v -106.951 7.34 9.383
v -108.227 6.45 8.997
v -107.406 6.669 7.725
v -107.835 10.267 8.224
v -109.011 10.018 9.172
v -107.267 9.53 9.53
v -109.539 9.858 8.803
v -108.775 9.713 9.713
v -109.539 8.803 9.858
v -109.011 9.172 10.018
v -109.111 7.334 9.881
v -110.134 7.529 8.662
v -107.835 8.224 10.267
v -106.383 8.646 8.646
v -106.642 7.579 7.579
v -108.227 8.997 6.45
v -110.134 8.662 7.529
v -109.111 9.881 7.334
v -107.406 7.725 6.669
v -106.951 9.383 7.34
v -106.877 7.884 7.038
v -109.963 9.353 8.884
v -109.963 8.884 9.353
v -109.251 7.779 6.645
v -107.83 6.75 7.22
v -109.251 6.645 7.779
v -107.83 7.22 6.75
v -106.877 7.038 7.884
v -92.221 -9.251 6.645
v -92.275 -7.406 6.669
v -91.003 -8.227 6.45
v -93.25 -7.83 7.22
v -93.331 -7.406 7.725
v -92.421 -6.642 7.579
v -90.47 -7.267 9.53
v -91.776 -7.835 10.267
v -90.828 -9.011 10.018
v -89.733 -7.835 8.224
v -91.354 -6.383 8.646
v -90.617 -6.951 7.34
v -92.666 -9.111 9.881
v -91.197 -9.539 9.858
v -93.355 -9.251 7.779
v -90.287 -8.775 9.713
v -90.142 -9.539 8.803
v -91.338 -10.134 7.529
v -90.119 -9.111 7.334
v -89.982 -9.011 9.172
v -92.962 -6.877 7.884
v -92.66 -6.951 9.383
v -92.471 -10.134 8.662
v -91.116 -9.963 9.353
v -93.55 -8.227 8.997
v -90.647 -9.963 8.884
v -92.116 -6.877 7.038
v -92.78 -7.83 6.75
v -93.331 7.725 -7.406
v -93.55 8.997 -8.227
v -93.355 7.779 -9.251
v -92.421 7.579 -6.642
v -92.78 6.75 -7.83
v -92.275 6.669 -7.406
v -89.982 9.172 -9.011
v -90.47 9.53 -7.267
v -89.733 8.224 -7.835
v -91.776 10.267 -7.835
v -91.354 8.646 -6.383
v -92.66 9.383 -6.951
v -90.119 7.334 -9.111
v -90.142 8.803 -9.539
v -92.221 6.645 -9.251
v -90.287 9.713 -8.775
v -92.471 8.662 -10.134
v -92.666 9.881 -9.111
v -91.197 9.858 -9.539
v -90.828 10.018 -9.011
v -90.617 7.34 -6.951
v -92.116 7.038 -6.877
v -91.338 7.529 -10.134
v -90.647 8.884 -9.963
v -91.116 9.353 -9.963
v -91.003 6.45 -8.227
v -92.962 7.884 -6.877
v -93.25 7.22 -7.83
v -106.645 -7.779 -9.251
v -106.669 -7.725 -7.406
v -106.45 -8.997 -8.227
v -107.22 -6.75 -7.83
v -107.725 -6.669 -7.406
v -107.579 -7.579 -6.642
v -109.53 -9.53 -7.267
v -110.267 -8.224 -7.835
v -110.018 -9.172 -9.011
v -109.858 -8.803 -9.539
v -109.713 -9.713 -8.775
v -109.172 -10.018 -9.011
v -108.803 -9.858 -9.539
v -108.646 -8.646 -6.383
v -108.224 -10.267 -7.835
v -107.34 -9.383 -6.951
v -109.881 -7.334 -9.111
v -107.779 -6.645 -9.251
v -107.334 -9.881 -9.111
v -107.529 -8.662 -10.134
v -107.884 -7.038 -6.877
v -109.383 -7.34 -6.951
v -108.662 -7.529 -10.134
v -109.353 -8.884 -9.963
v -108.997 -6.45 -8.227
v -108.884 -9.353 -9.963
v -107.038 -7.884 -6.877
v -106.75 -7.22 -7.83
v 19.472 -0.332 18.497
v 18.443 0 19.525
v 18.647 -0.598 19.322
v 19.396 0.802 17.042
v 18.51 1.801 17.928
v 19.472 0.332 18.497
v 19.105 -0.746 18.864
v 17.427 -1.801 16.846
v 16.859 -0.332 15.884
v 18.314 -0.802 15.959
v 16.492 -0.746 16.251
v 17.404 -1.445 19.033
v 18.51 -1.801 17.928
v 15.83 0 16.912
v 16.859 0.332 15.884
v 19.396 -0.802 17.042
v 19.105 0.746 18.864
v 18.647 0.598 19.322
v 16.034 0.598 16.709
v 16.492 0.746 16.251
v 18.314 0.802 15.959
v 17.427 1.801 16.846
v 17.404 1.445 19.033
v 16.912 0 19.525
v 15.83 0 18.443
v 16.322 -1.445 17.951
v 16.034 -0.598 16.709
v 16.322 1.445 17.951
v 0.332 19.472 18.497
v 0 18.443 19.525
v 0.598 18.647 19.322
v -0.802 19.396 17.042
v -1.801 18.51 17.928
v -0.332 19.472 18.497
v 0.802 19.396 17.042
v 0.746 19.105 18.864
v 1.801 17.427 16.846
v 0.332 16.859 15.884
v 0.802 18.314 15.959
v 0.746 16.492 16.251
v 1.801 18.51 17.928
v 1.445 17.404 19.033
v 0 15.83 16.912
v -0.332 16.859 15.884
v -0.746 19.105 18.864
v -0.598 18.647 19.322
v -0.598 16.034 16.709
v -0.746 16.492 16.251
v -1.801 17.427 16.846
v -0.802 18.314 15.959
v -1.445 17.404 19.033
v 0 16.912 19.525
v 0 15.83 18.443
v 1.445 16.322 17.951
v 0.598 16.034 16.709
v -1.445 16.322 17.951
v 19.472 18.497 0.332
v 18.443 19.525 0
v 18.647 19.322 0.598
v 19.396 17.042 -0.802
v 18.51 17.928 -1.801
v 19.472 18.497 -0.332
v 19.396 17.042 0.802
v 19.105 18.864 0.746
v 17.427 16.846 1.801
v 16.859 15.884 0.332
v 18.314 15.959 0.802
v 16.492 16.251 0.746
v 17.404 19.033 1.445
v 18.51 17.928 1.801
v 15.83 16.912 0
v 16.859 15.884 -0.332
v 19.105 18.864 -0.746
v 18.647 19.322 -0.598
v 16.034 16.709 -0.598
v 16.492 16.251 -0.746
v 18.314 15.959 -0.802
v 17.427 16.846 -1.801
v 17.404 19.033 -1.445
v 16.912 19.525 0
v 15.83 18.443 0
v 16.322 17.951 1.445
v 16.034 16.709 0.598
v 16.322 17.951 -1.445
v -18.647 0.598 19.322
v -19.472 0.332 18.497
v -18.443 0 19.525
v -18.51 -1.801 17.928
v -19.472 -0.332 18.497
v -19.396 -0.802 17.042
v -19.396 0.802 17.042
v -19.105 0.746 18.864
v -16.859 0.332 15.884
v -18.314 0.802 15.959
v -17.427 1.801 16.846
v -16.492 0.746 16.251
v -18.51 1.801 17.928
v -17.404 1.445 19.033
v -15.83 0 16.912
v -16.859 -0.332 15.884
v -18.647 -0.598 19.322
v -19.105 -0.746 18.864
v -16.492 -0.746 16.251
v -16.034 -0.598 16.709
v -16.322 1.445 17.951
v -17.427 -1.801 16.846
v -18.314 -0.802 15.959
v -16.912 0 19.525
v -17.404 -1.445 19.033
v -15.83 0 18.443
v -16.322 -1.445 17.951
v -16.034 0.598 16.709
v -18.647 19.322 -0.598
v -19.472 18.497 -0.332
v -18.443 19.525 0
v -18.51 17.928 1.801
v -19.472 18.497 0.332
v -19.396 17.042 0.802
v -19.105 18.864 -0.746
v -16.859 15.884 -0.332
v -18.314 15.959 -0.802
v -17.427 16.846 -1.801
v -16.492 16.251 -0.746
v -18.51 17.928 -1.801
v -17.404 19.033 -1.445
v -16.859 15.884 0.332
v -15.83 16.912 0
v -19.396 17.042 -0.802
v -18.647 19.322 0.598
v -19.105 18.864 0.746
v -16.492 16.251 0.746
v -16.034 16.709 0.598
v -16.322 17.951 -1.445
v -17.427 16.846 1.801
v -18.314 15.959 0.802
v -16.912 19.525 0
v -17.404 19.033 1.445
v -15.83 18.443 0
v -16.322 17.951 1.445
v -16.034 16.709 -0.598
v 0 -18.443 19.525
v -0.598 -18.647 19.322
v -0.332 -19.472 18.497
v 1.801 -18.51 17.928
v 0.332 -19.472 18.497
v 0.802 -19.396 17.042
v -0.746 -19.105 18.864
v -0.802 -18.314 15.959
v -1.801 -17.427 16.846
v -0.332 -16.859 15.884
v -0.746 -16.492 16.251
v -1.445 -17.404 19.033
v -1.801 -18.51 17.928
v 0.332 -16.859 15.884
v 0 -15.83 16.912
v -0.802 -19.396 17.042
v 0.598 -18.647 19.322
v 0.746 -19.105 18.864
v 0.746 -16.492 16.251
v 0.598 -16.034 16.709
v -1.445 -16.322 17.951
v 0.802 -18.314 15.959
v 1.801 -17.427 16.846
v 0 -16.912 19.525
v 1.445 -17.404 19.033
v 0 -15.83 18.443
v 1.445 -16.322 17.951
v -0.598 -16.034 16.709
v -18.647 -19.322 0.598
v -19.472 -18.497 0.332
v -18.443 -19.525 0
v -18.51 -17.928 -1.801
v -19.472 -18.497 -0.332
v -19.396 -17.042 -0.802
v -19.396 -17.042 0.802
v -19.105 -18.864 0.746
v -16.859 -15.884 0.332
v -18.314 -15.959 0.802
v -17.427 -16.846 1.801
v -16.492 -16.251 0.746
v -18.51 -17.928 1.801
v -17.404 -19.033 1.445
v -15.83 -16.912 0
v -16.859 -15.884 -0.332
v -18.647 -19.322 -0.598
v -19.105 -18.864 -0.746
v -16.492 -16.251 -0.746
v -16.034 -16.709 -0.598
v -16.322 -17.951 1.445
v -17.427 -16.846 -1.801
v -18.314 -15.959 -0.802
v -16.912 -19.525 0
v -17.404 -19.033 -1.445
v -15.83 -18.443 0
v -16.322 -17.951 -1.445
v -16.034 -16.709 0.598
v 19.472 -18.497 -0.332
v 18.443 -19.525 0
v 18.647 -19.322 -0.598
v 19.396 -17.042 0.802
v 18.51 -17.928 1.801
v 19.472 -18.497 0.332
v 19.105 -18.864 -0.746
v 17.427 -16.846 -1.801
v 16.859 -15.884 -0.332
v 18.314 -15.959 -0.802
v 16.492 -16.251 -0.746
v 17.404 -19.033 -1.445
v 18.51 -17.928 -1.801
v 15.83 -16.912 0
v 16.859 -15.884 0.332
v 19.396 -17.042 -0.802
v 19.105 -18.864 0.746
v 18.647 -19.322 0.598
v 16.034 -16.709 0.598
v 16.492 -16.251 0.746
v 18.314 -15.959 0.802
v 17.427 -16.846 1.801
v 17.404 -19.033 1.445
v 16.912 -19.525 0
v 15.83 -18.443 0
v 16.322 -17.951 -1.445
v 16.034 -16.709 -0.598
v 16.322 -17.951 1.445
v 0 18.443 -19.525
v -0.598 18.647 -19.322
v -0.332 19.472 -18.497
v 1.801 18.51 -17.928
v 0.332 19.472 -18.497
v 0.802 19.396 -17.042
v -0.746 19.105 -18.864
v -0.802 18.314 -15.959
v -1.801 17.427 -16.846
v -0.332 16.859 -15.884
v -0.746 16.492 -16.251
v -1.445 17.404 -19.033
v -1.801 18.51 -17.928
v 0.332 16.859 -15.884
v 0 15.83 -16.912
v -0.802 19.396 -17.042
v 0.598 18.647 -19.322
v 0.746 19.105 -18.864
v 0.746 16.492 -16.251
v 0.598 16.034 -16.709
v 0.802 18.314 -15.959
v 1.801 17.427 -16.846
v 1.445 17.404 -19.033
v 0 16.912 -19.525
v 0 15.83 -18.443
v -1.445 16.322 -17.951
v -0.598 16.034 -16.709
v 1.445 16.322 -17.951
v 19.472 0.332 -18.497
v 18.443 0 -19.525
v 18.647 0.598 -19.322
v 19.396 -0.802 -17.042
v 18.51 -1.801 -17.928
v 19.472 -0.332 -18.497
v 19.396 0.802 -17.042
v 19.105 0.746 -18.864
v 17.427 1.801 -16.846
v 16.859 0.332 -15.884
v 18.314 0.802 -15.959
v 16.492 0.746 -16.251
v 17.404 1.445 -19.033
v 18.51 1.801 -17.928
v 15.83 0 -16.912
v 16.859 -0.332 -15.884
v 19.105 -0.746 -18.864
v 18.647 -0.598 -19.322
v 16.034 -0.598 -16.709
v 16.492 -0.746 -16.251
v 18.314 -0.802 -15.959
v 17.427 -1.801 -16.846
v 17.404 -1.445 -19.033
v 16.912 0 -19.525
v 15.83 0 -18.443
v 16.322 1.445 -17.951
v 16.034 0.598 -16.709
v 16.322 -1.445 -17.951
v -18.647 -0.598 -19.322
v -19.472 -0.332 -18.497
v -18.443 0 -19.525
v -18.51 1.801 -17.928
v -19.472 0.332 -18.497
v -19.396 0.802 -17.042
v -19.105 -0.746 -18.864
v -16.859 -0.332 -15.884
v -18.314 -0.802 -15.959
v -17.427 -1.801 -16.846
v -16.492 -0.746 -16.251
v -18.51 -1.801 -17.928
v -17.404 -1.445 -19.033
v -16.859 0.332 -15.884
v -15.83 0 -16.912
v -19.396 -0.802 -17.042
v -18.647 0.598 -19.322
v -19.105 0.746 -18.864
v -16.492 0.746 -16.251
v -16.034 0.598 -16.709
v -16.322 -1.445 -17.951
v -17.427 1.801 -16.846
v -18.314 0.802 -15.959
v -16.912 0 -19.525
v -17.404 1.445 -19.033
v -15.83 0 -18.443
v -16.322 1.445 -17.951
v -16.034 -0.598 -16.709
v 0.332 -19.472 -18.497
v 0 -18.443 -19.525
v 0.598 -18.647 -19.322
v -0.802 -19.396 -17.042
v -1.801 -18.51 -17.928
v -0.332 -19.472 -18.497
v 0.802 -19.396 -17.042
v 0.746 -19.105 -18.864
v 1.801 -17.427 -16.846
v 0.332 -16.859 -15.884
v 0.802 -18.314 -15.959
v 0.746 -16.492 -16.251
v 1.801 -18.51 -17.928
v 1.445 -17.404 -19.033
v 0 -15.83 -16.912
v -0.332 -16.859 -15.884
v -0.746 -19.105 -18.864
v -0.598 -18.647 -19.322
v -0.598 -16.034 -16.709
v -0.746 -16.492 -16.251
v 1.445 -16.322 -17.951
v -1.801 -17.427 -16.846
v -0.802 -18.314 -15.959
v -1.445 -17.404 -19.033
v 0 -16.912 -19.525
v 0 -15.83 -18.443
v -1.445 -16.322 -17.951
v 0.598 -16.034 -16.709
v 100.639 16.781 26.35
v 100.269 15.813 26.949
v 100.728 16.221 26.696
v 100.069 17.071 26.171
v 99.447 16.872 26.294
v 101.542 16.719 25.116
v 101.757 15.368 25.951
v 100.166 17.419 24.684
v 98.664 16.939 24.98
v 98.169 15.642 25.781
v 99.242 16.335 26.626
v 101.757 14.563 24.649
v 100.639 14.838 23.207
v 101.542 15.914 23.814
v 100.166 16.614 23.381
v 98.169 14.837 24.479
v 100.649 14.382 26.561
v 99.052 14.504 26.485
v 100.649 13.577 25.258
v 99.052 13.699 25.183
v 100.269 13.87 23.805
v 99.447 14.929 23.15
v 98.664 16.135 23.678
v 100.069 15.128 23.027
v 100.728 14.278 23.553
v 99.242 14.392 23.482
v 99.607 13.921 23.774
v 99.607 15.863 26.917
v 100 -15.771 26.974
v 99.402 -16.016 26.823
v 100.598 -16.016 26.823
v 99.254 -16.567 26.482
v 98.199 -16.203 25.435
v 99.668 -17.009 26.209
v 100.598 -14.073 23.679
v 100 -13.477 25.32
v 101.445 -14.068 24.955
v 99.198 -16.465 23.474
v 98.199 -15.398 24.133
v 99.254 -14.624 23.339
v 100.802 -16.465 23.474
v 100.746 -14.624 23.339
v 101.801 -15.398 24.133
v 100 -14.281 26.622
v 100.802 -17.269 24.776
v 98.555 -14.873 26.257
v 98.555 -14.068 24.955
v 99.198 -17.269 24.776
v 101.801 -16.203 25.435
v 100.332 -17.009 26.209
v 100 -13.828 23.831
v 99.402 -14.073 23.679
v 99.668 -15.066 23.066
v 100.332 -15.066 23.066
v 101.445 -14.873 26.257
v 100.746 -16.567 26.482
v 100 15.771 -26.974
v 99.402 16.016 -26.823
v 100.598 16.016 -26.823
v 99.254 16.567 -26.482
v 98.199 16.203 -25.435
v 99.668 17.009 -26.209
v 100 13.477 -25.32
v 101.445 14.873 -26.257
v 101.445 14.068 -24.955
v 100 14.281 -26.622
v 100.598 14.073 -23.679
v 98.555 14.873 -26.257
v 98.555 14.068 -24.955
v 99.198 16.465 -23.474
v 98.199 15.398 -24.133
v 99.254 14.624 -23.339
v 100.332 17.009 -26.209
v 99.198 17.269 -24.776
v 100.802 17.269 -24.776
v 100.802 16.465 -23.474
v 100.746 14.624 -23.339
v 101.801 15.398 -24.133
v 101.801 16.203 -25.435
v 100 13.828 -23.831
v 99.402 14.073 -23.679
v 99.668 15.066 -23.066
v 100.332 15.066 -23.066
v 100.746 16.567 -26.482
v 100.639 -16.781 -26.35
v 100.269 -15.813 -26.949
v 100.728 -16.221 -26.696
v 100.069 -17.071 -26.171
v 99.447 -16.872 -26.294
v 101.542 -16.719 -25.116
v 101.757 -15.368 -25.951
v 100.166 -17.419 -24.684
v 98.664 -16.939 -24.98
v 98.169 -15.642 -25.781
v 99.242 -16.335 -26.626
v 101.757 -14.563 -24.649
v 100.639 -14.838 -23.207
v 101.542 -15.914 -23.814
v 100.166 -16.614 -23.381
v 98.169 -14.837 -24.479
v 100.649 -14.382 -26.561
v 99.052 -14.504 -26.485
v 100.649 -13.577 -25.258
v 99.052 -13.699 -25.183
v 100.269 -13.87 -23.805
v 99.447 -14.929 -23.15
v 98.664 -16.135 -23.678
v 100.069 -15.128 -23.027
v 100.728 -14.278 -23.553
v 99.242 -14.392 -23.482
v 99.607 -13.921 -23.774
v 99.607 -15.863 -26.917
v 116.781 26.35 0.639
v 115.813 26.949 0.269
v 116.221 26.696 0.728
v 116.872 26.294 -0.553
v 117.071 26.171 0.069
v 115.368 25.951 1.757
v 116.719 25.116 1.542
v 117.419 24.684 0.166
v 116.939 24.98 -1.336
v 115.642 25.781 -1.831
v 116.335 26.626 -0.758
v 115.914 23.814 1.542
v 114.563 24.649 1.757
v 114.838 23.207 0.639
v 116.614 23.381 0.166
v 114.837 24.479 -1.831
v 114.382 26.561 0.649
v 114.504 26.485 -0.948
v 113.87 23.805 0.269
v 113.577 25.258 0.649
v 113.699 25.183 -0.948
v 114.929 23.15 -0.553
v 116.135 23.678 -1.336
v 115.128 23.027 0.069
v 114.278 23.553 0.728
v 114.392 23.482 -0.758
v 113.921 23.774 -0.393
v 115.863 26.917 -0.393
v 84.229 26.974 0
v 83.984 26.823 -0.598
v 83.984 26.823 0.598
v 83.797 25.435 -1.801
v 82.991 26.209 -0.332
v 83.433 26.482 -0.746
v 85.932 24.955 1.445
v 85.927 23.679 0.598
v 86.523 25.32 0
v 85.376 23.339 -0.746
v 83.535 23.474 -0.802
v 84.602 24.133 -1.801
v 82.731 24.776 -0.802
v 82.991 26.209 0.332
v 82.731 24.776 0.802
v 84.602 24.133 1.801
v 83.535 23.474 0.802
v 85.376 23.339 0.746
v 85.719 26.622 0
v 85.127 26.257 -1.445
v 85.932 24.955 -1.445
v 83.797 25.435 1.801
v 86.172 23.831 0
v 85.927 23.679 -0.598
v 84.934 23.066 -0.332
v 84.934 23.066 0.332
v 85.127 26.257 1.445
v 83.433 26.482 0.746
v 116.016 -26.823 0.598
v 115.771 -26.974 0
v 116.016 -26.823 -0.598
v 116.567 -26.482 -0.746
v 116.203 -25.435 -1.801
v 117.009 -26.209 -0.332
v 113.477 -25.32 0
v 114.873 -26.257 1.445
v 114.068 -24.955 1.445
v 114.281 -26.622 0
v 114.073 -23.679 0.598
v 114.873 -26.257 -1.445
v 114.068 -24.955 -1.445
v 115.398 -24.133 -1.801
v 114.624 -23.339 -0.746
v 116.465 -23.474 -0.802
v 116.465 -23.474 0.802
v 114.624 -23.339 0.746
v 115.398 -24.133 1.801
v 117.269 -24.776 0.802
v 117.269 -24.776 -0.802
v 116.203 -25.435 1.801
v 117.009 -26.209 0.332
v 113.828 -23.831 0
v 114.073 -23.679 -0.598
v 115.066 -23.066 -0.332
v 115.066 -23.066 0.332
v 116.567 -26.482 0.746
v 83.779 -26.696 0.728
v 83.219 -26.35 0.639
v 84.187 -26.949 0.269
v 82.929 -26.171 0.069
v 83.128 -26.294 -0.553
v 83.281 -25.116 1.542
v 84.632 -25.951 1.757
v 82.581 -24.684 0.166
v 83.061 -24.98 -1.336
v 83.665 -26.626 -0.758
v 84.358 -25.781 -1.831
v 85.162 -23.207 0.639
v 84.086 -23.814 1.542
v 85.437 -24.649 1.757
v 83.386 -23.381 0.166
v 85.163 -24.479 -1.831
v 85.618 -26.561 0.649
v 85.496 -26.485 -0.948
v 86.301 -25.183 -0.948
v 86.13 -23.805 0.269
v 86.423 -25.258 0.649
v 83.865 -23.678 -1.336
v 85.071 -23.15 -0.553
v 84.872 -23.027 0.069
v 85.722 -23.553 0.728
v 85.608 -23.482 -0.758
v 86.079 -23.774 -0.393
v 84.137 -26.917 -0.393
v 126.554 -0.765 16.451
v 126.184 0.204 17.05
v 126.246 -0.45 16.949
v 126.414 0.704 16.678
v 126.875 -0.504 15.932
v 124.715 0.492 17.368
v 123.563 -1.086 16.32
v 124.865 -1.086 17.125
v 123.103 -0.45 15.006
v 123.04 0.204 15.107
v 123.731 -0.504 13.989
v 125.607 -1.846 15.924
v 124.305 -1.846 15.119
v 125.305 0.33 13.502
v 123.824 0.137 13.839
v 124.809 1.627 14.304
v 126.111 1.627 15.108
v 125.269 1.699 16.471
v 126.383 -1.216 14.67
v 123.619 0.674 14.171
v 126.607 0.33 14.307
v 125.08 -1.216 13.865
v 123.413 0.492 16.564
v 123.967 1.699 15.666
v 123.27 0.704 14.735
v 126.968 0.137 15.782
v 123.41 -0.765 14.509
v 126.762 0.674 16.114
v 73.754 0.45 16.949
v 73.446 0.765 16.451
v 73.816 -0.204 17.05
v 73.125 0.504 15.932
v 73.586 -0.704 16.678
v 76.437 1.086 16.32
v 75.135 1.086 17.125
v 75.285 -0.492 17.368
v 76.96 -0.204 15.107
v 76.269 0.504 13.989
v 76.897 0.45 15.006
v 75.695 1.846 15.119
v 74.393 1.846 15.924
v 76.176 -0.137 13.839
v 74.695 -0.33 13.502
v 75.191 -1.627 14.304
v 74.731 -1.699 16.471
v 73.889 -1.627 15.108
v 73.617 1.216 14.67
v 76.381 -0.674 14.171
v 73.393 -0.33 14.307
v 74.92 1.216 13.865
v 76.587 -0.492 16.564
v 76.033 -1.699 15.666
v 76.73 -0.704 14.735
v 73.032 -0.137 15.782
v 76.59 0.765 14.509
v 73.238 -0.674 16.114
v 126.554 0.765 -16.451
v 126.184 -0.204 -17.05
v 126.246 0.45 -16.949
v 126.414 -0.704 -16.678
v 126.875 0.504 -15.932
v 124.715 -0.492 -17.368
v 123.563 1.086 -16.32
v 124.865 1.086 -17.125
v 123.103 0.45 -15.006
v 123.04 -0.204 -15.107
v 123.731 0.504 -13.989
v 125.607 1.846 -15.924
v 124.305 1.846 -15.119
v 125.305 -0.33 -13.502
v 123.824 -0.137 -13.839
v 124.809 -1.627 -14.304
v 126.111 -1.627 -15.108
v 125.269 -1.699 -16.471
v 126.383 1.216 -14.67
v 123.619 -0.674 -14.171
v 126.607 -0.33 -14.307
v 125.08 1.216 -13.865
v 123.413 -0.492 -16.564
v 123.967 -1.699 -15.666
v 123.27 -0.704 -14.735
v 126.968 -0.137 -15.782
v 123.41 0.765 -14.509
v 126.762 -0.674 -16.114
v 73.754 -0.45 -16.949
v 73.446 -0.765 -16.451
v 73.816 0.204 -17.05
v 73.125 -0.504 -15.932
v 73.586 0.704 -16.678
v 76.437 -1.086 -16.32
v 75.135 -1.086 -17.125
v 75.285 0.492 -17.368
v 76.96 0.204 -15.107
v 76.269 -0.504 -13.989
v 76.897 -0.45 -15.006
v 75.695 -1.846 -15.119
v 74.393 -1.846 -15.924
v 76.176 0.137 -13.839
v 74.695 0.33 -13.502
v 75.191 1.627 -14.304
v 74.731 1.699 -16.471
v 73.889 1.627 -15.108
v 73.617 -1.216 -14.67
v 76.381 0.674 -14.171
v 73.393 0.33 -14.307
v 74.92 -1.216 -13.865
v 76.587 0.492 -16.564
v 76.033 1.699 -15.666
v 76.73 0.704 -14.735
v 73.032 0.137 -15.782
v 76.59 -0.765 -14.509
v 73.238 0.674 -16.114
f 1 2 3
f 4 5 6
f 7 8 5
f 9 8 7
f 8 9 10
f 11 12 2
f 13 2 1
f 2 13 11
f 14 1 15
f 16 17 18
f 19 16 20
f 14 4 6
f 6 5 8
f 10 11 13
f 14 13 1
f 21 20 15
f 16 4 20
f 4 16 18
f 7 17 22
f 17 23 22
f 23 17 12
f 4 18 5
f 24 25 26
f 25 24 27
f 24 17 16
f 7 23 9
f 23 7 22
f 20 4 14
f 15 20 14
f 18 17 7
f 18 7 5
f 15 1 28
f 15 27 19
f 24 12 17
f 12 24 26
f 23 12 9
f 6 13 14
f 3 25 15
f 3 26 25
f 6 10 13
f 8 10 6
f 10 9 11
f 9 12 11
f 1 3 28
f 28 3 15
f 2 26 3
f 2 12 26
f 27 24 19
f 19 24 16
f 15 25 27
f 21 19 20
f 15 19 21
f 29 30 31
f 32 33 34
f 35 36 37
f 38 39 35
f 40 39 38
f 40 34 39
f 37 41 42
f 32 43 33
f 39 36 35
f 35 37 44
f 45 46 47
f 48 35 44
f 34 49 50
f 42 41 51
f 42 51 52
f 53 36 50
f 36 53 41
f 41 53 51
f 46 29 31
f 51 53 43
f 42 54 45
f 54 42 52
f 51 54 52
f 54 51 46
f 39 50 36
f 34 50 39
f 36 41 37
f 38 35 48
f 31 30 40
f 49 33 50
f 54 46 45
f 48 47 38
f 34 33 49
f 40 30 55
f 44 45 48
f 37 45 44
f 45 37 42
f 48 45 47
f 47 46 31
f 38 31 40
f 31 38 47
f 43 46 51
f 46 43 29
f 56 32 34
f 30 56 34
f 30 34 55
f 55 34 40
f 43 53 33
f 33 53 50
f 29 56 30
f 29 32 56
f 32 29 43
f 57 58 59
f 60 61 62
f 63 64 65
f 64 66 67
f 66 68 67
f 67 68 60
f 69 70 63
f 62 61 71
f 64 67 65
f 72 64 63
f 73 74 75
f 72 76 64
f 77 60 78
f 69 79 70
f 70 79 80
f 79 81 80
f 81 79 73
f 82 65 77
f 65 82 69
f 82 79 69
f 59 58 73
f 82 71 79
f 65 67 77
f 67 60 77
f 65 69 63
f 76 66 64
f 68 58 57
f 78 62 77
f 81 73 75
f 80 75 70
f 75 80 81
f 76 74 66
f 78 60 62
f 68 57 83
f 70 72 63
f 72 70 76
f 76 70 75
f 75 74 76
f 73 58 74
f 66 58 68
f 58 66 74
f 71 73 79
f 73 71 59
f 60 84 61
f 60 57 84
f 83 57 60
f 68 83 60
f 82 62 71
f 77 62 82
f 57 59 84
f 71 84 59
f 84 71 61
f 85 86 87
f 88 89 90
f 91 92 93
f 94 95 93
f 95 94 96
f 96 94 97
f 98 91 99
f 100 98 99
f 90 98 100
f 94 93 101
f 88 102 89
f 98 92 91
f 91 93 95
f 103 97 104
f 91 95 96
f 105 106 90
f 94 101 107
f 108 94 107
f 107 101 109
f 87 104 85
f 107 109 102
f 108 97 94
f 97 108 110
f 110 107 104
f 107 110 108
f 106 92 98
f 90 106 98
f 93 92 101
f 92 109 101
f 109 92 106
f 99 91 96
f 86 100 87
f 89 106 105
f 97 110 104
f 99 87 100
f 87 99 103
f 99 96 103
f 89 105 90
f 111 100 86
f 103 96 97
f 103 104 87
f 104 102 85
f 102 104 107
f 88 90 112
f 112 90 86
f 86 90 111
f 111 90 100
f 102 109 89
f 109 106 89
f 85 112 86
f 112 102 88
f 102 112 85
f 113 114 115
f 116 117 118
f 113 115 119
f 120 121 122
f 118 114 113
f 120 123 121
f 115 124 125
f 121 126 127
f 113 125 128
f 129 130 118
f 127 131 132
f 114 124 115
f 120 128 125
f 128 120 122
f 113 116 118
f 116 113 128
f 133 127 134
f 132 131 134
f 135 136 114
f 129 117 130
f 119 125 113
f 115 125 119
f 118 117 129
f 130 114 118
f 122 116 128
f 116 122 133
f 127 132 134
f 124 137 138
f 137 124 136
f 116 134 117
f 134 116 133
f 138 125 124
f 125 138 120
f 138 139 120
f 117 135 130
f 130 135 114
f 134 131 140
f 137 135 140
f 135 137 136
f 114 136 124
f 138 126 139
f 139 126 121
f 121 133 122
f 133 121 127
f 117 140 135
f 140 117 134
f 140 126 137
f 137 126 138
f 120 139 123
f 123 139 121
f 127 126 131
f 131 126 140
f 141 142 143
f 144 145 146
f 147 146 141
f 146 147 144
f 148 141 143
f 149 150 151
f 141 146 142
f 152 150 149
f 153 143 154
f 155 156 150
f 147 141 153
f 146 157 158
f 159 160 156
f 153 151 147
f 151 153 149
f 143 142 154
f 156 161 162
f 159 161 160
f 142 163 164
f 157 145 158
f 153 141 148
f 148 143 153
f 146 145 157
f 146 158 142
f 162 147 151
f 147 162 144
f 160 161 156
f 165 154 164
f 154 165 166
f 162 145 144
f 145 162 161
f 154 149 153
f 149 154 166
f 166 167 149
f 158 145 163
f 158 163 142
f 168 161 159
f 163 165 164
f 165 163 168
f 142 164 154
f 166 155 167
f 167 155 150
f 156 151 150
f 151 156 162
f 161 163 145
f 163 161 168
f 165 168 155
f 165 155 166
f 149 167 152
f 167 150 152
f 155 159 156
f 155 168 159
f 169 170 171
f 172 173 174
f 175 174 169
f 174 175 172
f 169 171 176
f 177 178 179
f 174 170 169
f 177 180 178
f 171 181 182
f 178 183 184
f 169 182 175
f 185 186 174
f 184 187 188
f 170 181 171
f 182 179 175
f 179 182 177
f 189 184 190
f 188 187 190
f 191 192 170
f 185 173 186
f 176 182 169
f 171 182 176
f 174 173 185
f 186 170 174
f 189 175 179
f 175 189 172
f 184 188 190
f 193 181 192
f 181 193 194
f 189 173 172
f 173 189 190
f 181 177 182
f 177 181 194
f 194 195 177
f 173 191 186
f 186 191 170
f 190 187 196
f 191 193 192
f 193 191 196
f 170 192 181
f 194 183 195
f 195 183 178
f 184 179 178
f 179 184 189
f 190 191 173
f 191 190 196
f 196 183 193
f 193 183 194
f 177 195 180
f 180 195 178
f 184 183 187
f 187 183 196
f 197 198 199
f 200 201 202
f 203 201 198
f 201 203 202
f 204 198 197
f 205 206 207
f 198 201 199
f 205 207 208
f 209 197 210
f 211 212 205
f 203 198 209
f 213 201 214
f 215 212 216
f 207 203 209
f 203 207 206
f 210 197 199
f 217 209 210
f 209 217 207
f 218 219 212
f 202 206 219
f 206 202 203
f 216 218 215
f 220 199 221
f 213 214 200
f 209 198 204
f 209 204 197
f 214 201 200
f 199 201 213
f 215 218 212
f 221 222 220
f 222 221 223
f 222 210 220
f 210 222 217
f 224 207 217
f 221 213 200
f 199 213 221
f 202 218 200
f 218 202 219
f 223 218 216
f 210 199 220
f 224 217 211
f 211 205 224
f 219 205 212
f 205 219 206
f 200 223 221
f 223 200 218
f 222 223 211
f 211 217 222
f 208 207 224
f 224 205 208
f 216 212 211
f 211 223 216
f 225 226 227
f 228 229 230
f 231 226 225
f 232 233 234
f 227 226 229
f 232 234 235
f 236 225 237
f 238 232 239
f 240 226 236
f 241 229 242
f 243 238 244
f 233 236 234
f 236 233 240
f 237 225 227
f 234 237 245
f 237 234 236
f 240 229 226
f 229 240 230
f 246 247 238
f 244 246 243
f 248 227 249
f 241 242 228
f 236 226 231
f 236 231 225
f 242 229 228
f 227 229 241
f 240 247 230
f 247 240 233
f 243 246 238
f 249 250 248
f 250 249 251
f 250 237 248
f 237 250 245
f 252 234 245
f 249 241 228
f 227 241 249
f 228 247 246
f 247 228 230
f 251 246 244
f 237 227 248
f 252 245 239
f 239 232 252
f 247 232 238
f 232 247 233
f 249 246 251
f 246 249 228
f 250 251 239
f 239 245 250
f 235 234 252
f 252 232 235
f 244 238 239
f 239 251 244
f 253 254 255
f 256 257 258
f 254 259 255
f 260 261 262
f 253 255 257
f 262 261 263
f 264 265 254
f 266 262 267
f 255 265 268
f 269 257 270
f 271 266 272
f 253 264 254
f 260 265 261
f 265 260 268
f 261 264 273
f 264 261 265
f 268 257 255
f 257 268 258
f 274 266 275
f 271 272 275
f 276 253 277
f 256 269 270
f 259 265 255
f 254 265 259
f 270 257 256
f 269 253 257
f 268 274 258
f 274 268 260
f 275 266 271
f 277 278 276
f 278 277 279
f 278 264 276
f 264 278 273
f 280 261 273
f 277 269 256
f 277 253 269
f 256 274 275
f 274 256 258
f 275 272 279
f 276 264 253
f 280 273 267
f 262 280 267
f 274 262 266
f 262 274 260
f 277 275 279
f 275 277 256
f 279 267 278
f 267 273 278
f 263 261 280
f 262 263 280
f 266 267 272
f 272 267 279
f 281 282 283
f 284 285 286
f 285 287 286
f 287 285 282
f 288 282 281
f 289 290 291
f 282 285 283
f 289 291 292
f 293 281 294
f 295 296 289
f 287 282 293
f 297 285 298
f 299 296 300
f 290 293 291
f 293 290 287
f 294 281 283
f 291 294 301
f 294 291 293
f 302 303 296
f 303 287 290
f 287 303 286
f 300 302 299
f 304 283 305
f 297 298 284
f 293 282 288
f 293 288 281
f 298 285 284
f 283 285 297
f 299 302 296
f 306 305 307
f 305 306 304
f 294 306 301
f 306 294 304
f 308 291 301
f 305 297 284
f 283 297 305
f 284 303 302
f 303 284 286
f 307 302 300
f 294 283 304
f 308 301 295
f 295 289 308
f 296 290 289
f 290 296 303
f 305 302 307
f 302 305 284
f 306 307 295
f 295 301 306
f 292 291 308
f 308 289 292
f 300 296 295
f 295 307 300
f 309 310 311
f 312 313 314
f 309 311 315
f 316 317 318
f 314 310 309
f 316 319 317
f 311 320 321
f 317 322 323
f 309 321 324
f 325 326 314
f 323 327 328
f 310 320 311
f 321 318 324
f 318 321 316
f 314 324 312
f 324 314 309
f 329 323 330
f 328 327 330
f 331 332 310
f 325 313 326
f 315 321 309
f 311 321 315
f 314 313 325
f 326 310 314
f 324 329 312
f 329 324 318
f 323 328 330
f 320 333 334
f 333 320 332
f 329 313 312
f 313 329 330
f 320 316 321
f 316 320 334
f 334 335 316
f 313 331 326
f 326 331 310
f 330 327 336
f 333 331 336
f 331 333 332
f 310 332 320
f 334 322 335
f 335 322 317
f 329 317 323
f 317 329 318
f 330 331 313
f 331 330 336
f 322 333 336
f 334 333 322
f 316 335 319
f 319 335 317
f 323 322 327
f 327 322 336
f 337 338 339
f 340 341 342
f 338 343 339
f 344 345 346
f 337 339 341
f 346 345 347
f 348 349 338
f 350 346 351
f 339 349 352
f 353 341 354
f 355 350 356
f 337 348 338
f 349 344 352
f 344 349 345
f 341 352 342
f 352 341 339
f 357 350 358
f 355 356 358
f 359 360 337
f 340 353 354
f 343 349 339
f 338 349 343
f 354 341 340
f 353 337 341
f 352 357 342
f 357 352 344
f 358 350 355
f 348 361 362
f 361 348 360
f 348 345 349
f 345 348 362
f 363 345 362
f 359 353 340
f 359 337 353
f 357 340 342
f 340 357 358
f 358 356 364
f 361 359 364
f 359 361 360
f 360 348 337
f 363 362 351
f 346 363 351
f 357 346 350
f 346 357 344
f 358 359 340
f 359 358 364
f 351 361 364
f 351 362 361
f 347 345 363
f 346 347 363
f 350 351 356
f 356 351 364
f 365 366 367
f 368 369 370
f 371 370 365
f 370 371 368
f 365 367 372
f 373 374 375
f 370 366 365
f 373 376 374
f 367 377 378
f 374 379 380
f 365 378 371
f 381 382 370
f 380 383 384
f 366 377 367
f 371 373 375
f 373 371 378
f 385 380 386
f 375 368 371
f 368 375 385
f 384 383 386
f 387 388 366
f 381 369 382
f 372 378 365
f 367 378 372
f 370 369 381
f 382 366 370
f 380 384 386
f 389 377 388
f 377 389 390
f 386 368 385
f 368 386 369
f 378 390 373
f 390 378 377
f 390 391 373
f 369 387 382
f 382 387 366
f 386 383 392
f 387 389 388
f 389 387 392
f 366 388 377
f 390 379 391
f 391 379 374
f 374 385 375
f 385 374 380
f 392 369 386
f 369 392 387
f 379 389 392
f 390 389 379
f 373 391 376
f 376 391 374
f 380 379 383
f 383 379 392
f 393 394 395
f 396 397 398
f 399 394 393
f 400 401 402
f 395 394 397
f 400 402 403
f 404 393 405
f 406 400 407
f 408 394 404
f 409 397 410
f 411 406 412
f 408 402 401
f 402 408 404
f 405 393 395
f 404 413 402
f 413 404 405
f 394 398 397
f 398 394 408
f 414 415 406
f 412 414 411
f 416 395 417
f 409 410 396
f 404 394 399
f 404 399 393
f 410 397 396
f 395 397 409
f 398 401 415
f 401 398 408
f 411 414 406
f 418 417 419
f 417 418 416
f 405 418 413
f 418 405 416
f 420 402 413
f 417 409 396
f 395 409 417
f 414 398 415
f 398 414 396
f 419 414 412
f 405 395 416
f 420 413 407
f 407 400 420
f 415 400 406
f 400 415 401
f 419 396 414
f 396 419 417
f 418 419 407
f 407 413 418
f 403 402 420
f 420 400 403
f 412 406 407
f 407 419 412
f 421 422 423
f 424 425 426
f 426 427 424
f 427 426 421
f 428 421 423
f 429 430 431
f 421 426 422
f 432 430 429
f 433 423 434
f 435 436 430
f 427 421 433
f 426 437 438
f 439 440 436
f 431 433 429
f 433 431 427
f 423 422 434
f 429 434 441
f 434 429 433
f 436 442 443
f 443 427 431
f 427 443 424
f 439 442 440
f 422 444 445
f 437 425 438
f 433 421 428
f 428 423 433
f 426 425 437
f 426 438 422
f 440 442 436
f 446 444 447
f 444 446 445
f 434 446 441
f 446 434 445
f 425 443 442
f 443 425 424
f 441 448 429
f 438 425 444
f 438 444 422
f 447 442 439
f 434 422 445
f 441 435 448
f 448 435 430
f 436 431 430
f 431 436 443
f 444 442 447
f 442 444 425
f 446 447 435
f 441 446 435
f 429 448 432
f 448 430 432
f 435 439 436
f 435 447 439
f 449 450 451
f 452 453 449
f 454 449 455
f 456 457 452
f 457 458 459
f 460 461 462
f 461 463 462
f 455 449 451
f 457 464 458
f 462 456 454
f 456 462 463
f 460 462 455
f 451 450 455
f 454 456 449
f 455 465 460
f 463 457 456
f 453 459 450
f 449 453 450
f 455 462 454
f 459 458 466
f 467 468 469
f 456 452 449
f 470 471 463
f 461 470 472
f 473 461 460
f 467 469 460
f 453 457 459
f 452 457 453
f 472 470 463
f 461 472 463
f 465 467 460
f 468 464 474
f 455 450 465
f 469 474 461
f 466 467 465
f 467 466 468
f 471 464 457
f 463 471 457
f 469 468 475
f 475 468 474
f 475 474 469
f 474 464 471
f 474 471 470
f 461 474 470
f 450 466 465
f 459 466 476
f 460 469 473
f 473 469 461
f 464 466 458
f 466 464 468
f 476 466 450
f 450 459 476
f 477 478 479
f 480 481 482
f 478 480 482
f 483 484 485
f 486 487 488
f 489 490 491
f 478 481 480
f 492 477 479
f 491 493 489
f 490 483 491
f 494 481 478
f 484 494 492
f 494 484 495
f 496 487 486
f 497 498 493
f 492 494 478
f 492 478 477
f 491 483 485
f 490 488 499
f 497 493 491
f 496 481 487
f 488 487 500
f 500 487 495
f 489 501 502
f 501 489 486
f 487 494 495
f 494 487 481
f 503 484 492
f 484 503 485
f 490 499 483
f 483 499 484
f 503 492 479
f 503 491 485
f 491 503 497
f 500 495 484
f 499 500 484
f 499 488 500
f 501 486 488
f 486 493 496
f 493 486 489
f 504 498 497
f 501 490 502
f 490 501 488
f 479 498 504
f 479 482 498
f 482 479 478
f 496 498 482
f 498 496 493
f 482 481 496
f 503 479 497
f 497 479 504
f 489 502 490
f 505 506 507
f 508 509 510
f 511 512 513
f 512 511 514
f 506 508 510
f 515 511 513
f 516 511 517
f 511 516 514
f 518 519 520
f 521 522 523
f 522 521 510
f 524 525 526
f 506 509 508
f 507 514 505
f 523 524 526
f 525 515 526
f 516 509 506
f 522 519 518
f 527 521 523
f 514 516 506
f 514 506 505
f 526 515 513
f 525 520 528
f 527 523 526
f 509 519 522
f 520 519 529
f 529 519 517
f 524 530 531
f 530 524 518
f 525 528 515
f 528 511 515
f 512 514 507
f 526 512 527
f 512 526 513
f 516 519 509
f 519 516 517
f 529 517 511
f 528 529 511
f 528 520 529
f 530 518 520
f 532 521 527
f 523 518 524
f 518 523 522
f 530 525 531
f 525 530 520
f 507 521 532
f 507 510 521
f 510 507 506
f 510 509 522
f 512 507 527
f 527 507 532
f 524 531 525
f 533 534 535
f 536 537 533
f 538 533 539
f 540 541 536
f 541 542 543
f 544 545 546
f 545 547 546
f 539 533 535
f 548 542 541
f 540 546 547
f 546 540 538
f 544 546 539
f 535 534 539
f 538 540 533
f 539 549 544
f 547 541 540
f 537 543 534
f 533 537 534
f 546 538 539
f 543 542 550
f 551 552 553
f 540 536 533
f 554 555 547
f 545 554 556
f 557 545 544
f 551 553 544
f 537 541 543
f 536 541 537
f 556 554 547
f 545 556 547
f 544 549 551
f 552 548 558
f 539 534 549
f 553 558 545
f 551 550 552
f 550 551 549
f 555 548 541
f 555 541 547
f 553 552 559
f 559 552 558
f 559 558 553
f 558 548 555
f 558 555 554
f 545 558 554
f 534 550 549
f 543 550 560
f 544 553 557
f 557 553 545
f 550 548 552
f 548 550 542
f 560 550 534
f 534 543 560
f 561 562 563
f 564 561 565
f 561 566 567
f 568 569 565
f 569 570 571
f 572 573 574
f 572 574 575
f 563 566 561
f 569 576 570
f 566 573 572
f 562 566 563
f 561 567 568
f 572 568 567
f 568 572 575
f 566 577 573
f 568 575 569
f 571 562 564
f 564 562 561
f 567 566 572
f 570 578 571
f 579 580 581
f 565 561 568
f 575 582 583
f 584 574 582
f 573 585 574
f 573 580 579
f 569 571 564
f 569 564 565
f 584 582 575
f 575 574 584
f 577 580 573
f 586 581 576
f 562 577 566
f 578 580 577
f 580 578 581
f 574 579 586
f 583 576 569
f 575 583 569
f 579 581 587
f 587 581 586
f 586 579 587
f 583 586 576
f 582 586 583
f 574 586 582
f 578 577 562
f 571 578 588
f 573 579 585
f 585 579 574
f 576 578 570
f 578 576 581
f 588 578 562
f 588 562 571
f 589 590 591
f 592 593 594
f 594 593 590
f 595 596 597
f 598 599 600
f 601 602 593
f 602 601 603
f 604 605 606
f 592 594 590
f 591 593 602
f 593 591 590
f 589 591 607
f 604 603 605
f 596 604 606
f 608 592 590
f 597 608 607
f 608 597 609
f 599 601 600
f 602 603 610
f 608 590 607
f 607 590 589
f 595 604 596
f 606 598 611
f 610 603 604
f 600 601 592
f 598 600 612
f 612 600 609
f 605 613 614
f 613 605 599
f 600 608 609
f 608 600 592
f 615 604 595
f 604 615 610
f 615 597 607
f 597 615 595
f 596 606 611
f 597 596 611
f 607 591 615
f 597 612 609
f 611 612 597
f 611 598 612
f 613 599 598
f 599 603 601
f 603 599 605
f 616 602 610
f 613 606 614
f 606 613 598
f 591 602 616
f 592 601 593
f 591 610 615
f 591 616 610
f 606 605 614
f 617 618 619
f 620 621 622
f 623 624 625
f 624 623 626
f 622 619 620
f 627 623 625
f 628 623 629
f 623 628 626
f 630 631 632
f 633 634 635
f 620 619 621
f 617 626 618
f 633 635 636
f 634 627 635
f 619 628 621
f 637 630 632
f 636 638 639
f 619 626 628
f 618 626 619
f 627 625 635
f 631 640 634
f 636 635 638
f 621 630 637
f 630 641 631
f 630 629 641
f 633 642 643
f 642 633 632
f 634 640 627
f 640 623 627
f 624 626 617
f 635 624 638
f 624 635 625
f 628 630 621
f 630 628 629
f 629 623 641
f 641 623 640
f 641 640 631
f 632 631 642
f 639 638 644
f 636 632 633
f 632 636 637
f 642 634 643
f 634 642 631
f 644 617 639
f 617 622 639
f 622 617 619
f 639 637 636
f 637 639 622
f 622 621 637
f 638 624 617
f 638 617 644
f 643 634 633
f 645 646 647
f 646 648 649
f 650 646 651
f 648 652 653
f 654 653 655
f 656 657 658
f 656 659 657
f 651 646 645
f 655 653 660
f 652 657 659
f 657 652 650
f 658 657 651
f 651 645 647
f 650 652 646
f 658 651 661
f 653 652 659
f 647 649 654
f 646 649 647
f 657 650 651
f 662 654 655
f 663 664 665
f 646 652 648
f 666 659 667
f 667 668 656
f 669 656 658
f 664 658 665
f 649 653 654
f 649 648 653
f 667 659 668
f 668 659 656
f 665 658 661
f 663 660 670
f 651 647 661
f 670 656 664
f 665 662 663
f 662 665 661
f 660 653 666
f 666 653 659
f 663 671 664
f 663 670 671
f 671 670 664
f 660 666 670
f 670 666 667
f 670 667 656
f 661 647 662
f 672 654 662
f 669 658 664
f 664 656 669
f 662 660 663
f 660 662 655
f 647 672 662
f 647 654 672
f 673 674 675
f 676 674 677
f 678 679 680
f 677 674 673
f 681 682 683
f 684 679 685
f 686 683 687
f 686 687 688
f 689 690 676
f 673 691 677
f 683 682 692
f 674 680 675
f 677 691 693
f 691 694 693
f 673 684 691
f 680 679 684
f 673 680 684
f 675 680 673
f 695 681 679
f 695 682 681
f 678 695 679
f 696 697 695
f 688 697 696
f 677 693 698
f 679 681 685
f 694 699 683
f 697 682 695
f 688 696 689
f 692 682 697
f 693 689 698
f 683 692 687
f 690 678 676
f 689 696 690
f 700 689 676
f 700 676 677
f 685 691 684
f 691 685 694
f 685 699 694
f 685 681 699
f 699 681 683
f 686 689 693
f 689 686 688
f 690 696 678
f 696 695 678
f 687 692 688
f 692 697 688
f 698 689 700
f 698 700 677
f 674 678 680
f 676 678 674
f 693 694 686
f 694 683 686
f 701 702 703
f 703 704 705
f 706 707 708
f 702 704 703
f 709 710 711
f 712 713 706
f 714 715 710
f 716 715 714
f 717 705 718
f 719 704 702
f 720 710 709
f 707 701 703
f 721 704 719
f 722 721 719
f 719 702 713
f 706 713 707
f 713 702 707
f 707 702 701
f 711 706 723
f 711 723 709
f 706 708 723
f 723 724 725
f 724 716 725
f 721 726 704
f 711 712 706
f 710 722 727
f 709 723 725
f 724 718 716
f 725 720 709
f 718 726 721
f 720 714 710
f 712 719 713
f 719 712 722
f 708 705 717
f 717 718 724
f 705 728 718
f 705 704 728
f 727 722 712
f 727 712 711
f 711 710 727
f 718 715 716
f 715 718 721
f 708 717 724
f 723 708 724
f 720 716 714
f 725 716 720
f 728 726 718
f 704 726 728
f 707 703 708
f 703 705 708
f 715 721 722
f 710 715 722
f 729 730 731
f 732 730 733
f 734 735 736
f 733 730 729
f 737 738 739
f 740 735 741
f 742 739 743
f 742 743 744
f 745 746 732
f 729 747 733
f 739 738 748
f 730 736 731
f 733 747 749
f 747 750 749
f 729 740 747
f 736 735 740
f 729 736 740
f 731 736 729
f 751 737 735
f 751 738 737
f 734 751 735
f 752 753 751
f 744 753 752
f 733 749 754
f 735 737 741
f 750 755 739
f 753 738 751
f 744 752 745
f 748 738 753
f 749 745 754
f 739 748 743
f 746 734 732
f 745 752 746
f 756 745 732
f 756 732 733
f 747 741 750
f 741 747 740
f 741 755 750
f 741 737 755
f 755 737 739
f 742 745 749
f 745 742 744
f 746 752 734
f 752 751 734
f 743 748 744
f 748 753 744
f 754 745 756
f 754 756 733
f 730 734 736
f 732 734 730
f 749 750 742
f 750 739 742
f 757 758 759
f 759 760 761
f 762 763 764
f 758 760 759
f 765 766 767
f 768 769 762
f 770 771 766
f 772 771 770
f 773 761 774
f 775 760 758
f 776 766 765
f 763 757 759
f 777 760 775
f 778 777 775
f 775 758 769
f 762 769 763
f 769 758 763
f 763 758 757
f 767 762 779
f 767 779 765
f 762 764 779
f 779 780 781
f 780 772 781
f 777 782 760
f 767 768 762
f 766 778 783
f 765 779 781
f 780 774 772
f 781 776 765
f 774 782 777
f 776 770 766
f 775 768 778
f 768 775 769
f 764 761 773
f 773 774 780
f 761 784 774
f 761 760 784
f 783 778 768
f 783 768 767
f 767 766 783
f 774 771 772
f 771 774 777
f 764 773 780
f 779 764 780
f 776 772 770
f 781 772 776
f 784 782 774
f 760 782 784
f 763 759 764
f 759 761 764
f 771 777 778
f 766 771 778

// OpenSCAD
/*
 * This file is part of PolySymmetrica, a Polyhedral Geometry Modelling System.
 * Copyright 2025-2026 Susan Witts
 * SPDX-License-Identifier: MIT
 */

use <../polysymmetrica/core/placement.scad>
use <../polysymmetrica/models/tetrahedron.scad>
use <../polysymmetrica/models/octahedron.scad>
use <../polysymmetrica/models/icosahedron.scad>


echo("Testing face placement:");
translate([-100,0,0]) place_on_faces(tetrahedron(), 25) sphere(2);

echo("Testing edge placement:");
translate([0,0,0]) place_on_edges(octahedron(), 25) sphere(2);

echo("Testing vertex placement:");
translate([100,0,0]) place_on_vertices(icosahedron(), 25) sphere(2);
